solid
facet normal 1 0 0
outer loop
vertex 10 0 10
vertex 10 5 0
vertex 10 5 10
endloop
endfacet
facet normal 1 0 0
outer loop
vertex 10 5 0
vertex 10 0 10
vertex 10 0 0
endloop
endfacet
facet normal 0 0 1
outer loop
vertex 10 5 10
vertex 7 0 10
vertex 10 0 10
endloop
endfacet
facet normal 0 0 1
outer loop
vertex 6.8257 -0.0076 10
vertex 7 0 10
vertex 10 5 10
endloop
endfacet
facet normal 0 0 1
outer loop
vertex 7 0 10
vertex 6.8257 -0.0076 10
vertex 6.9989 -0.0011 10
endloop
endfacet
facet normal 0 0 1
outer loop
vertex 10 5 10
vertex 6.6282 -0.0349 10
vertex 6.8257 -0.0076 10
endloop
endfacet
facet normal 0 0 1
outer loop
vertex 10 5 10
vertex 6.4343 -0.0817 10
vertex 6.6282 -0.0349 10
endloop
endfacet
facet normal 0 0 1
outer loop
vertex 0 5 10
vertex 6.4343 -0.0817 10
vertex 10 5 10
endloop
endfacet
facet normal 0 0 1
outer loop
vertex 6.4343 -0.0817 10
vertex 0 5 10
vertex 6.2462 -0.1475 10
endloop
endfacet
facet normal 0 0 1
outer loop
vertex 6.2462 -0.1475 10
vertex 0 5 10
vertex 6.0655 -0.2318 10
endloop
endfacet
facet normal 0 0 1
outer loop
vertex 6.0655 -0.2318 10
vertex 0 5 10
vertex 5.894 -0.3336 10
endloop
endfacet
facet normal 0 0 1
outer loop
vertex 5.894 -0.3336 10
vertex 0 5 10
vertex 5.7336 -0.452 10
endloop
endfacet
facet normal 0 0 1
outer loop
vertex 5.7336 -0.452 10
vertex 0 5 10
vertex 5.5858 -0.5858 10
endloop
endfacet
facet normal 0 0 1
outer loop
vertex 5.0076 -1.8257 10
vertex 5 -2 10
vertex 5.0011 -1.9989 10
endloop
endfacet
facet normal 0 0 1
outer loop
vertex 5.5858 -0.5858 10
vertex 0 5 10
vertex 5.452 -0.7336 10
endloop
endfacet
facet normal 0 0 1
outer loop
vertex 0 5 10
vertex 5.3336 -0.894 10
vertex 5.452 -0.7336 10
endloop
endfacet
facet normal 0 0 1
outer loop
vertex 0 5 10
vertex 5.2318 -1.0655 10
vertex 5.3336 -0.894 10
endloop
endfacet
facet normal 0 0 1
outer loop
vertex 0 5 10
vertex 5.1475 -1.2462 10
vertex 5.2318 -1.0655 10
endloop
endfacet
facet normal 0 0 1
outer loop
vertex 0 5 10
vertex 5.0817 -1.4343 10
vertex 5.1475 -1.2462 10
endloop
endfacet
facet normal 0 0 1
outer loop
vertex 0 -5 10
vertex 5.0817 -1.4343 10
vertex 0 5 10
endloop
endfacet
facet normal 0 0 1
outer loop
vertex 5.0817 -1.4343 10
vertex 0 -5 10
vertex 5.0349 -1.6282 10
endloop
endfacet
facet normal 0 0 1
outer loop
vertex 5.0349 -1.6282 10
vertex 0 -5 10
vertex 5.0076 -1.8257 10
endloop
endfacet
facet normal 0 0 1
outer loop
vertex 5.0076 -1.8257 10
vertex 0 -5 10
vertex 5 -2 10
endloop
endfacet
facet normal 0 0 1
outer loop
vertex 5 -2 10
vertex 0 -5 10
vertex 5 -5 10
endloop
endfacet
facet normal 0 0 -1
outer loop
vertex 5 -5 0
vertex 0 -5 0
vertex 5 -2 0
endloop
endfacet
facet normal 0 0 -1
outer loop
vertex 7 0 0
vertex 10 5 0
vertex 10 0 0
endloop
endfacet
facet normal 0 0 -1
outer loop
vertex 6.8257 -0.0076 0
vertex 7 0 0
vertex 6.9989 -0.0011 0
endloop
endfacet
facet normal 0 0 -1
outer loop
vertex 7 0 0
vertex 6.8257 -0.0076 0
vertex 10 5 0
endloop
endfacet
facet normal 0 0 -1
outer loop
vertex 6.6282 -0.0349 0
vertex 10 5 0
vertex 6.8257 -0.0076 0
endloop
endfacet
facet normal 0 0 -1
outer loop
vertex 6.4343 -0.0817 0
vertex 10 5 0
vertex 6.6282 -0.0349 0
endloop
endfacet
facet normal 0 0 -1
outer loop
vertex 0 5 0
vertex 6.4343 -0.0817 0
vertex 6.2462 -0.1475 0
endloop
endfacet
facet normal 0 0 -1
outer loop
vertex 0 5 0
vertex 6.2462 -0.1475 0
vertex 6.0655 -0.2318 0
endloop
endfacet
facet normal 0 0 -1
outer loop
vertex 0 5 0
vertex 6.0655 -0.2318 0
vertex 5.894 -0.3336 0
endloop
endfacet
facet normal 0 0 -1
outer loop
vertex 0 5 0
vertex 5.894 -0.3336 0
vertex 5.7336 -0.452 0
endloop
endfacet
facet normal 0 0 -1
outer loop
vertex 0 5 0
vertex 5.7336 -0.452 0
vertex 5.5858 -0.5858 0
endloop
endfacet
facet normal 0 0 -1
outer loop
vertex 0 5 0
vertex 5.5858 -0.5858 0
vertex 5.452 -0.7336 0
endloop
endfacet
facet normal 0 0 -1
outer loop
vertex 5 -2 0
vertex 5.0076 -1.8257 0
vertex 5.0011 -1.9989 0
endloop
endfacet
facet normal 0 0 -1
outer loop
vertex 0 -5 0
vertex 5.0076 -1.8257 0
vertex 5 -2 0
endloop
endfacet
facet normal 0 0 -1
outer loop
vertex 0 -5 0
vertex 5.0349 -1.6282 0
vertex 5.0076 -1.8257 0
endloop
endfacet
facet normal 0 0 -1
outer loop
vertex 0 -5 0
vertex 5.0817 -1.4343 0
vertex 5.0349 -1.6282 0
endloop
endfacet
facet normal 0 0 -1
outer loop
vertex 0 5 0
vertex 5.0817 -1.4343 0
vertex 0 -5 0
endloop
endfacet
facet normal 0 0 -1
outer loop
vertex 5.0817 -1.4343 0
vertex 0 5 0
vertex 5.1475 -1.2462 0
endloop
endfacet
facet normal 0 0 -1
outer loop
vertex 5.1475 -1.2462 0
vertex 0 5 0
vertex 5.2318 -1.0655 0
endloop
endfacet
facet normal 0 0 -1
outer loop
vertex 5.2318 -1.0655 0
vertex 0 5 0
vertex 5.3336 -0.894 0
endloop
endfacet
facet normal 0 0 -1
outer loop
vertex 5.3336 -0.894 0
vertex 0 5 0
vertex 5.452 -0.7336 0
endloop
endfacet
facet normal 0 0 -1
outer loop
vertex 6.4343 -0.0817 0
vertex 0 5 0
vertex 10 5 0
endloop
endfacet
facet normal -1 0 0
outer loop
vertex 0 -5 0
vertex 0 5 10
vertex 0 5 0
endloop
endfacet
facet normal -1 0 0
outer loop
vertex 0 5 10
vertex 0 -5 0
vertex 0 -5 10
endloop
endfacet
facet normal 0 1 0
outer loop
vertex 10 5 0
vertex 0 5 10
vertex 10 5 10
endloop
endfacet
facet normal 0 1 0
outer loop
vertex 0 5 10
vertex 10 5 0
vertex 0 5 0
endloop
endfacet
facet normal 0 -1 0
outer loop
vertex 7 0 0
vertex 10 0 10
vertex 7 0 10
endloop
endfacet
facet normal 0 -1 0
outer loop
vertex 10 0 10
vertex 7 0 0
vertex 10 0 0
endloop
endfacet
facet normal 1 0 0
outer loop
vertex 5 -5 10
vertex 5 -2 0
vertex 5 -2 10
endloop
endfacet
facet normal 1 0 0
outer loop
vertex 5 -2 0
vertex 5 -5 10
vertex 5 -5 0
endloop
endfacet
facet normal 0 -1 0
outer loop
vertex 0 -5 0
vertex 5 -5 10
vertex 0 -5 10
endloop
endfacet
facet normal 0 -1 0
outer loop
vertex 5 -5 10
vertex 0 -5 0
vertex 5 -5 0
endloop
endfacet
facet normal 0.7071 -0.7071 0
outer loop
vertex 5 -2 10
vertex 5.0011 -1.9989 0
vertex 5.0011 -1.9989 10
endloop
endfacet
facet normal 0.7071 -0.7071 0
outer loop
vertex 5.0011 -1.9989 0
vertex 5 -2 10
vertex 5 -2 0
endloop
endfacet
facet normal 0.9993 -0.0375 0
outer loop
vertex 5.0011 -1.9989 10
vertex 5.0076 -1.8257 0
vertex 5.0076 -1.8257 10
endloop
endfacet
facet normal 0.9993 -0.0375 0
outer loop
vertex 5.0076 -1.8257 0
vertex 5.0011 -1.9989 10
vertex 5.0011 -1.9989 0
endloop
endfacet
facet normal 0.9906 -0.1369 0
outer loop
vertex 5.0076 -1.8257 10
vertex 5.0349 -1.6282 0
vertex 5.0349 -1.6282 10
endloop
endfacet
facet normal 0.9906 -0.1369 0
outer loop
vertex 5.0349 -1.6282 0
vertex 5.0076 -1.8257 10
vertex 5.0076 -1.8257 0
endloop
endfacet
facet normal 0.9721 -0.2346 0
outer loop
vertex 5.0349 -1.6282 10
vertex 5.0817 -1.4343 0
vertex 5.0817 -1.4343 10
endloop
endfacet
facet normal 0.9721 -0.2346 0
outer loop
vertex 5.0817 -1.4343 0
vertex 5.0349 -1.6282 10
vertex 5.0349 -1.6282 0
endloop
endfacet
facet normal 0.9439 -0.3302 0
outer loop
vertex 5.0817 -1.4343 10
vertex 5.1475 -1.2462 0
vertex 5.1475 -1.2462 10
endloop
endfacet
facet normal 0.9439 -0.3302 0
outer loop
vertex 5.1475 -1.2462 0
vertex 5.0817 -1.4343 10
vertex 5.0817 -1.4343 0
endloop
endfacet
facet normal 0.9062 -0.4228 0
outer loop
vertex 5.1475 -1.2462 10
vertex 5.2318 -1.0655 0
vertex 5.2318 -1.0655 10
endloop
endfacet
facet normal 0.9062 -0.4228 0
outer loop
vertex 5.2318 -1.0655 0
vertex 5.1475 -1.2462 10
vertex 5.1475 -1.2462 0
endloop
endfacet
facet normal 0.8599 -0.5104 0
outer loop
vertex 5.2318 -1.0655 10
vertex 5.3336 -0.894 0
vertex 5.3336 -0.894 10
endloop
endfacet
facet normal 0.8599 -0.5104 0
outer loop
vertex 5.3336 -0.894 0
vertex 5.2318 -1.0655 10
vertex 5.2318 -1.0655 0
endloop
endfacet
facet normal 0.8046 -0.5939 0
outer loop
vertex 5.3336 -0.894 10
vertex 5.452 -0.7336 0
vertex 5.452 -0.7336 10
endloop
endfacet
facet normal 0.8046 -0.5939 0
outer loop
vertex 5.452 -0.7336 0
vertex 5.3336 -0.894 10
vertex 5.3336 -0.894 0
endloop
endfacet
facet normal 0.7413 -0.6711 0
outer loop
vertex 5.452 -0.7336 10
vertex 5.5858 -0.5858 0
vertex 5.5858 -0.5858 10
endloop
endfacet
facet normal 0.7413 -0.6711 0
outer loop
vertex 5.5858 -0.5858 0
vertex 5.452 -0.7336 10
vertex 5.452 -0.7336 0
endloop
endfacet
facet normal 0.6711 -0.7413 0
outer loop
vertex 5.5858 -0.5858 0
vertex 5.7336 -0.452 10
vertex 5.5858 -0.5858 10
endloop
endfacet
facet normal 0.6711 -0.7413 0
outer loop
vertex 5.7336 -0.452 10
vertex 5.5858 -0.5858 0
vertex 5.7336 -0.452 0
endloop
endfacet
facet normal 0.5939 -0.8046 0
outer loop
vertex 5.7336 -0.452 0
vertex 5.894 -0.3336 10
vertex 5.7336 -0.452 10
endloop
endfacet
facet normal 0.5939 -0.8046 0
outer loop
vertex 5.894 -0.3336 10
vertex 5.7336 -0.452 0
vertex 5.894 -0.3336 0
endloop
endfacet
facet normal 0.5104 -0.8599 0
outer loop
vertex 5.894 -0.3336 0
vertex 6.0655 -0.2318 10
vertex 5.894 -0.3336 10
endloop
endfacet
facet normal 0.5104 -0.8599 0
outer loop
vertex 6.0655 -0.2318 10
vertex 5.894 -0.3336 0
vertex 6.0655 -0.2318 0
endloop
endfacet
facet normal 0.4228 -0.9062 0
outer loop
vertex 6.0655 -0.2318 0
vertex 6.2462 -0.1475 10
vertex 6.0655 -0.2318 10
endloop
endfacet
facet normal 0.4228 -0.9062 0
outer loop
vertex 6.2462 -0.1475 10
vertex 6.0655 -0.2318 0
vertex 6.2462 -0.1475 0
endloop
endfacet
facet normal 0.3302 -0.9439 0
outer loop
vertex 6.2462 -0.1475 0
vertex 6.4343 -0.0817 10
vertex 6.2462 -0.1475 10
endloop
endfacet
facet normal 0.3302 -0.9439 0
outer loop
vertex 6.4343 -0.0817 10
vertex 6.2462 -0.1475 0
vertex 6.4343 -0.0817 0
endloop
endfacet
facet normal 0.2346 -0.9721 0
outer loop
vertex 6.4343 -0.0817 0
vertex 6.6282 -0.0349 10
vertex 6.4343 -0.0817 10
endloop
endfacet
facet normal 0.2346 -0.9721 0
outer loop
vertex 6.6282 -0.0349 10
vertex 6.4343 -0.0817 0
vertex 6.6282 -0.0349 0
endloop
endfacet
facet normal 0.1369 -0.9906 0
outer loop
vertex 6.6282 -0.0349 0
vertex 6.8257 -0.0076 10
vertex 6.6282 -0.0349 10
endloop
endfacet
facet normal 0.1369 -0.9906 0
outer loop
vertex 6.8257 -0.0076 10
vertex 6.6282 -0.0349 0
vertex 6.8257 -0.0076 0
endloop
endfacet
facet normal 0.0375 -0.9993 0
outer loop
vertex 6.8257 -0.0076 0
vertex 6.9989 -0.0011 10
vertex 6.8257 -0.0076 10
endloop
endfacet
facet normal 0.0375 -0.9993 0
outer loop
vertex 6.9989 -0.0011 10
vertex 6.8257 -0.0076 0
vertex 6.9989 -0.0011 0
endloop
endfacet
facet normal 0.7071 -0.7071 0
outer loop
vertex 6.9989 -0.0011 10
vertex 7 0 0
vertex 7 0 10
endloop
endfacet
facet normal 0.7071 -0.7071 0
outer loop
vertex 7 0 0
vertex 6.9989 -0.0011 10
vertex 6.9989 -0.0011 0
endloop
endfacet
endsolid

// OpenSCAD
// file: davel.scad
/*
Library to draw simple bevel borders and buttresses.

By Davide Orlandi - davide[at]davideorlandi.it

    This program is free software: you can redistribute it and/or modify
    it under the terms of the GNU Affero General Public License as
		published by the Free Software Foundation, either version 3 of
		the License, or (at your option) any later version.

    This program is distributed in the hope that it will be useful,
    but WITHOUT ANY WARRANTY; without even the implied warranty of
    MERCHANTABILITY or FITNESS FOR A PARTICULAR PURPOSE.  See the
    GNU Affero General Public License for more details.

    You should have received a copy of the GNU Affero General Public
		License along with this program.  If not, see
		<http://www.gnu.org/licenses/>.
*/


/* -------- bevel ----- */

/*
Draw a bevel.
- length: length of the bevel, longitudinally.
- n1: normal vector of the first surface.
- n2: normal vector of the second surface.
- r: radius of the bevel.
- side_offset: extra length added to the sides (optional, default 0.01).
- back offset: extra thickness added to the back of the bevel (optional, default 0.01).
*/
module davel_bevel(length, n1, n2, r, side_offset=0.01, back_offset = 0.01)
{
	assert(is_list(n1));
	assert(is_list(n2));
	
	n1n = n1 / norm(n1);
	n2n = n2 / norm(n2);
	
	assert(n1n != n2n);
	
	dir = cross(n1, n2);
	
	assert(norm(dir) > 0);
	
	dirn = dir / norm(dir);
	
	nt = n1n + n2n;
	
	assert(norm(nt) > 0);
	
	ntn = nt / norm(nt);
	ang = 90 - acos(n2n * ntn);
	c = -ntn * r / sin(ang);
	ptang1 = c + n1n * r;
	ptang2 = c + n2n * r;
		
	newz = dirn;
	newx = ntn;
	newy = cross(newz, newx);
	
	m = davel_matrix_from_columns4([newx, newy, newz]);
	m_inv = davel_transpose3(davel_matrix4_to_3(m));
	
	ptang1_off = ptang1 + n1n * back_offset;
	ptang2_off = ptang2 + n2n * back_offset;
	origin_off = ntn * back_offset;
	profile = [origin_off, ptang1_off, ptang1, ptang2, ptang2_off];
	
	// rotate the points so that what was the axis of the bevel (dir) is
	// now the z axis and the normal of the bevel (ntn) is now the x
	// axis.
	profile_derotated = davel_matrix_product_vectors3(m_inv,profile);
	c_derotated = davel_matrix_product_vector3(m_inv, c);
	
	// create a 2d list of point to use for polygon()
	profile_flat = davel_vectors3_to_2(profile_derotated);
	
	multmatrix(m)
	{
		linear_extrude(height=length + side_offset*2, center=true)
		{
			difference()
			{
				#polygon(profile_flat);
				
				translate(c_derotated) circle(r=r);
			}
		}
	}
}

/*
Draw bevels for a box.
- size: 3-dimension vector size of the box.
- r: radius of the bevel.
- center: boolean, if true the box is centered. Optional, default is false.
- front, back, top, bottom, left, right: boolean, draw or omit bevels for that
  corner. They are all optional, default is true.
- round_vert: boolean, if true draw a rounded vertex using a sphere. Optional,
  default is true.
- side_offset: extra length added to the sides og the single bevels
  (optional, default 0.01).
- back offset: extra thickness added to the back of the single bevels
  (optional, default 0.01).
*/
module davel_box_bevel(size, r, center=false, front=true, back=true, top=true, bottom=true, left=true, right=true, round_vert=true, side_offset = 0.01, back_offset = 0.01)
{	
	translate(center ? -size/2 : [0,0,0])
	{
		union()
		{
			if (top && left)
				davel_bevel_pos([0, size[1]/2, size[2]], size[1], [-1,0,0], [0,0,1], r, side_offset, back_offset);
			if (top && right)
				davel_bevel_pos([size[0], size[1]/2, size[2]], size[1], [1,0,0], [0,0,1], r, side_offset, back_offset);
			if (bottom && left)
				davel_bevel_pos([0, size[1]/2, 0], size[1], [-1,0,0], [0,0,-1], r, side_offset, back_offset);
			if (bottom && right)
				davel_bevel_pos([size[0], size[1]/2, 0], size[1], [1,0,0], [0,0,-1], r, side_offset, back_offset);
			
			if (front && top)
				davel_bevel_pos([size[0]/2, 0, size[2]], size[0], [0,-1,0], [0,0,1], r, side_offset, back_offset);
			if (front && bottom)
				davel_bevel_pos([size[0]/2, 0, 0], size[0], [0,-1,0], [0,0,-1], r, side_offset, back_offset);
			if (back && top)
				davel_bevel_pos([size[0]/2, size[1], size[2]], size[0], [0,1,0], [0,0,1], r, side_offset, back_offset);
			if (back && bottom)
				davel_bevel_pos([size[0]/2, size[1], 0], size[0], [0,1,0], [0,0,-1], r, side_offset, back_offset);
			
			if (front && left)
				davel_bevel_pos([0, 0, size[2]/2], size[2], [0,-1,0], [-1,0,0], r, side_offset, back_offset);
			if (front && right)
				davel_bevel_pos([size[0], 0, size[2]/2], size[2], [0,-1,0], [1,0,0], r, side_offset, back_offset);
			if (back && left)
				davel_bevel_pos([0, size[1], size[2]/2], size[2], [0,1,0], [-1,0,0], r, side_offset, back_offset);
			if (back && right)
				davel_bevel_pos([size[0], size[1], size[2]/2], size[2], [0,1,0], [1,0,0], r, side_offset, back_offset);
			
			if (round_vert)
			{
				if (bottom && front && left)
					davel_round_vertex([0,0,0], [-1,-1,-1], r);
				if (bottom && front && right)
					davel_round_vertex([size[0],0,0], [1,-1,-1], r);
				if (top && front && left)
					davel_round_vertex([0,0,size[2]], [-1,-1,1], r);
				if (top && front && right)
					davel_round_vertex([size[0],0,size[2]], [1,-1,1], r);
				if (bottom && back && left)
					davel_round_vertex([0,size[1],0], [-1,1,-1], r);
				if (bottom && back && right)
					davel_round_vertex([size[0],size[1],0], [1,1,-1], r);
				if (top && back && left)
					davel_round_vertex([0,size[1],size[2]], [-1,1,1], r);
				if (top && back && right)
					davel_round_vertex([size[0],size[1],size[2]], [1,1,1], r);
			}
		}
	}
}

/*
Draw a bevel, specifying its center point (so you don't need to translate()
it yourself).
- pos: 3-dimension vector position.
- length: length of the bevel, longitudinally.
- n1: normal vector of the first surface.
- n2: normal vector of the second surface.
- r: radius of the bevel.
- side_offset: extra length added to the sides (optional, default 0.01).
- back offset: extra thickness added to the back of the bevel (optional, default 0.01).
*/
module davel_bevel_pos(pos, length, n1, n2, r, side_offset=0.01, back_offset = 0.01)
{
	translate(pos) davel_bevel(length, n1, n2, r, side_offset=side_offset, back_offset=back_offset);
}

/*
Draw a bevel, specifying its side points (top and bottom
of the "cylinder") instead of center point and length.
- p1: 3-dimension vector of the first end.
- p2: 3-dimension vector of the second end.
- n1: normal vector of the first surface.
- n2: normal vector of the second surface.
- r: radius of the bevel.
- side_offset: extra length added to the sides (optional, default 0.01).
- back offset: extra thickness added to the back of the bevel (optional, default 0.01).
*/
module davel_bevel_points(p1, p2, n1, n2, r, side_offset=0.01, back_offset = 0.01)
{
	davel_bevel_pos((p1+p2)/2, norm(p2-p1), n1, n2, r, side_offset=side_offset, back_offset=back_offset);
}


/* ----- buttress ----- */

/*
Draw a buttress.
- length: length of the buttress, longitudinally.
- n1: normal vector of the first surface.
- n2: normal vector of the second surface.
- r: radius of the buttress.
- side_offset: extra length added to the sides (optional, default 0).
- back offset: extra thickness added to the back of the buttress (optional, default 0.01).
*/
module davel_buttress(length, n1, n2, r, side_offset=0, back_offset = 0.01)
{
	davel_bevel(length, -n1, -n2, r, side_offset=side_offset, back_offset=back_offset);
}

/*
Draw a buttress, specifying its center point (so you don't need to translate()
it yourself).
- pos: 3-dimension vector position.
- length: length of the buttress, longitudinally.
- n1: normal vector of the first surface.
- n2: normal vector of the second surface.
- r: radius of the buttress.
- side_offset: extra length added to the sides (optional, default 0).
- back offset: extra thickness added to the back of the buttress (optional, default 0.01).
*/
module davel_buttress_pos(pos, length, n1, n2, r, side_offset=0, back_offset=0.01)
{
	translate(pos) davel_buttress(length, n1, n2, r, side_offset=side_offset, back_offset=back_offset);
}

/*
Draw a buttress, specifying its side points (top and bottom
of the "cylinder") instead of center point and length.
- p1: 3-dimension vector of the first end.
- p2: 3-dimension vector of the second end.
- n1: normal vector of the first surface.
- n2: normal vector of the second surface.
- r: radius of the buttress.
- side_offset: extra length added to the sides (optional, default 0).
- back offset: extra thickness added to the back of the buttress (optional, default 0.01).
*/
module davel_buttress_points(p1, p2, n1, n2, r, side_offset=0, back_offset=0.01)
{
	davel_buttress_pos((p1+p2)/2, norm(p2-p1), n1, n2, r, side_offset=side_offset, back_offset=back_offset);
}

/*
Draw buttresses for a box.
- size: 3-dimension vector size of the box.
- r: radius of the buttress.
- center: boolean, if true the box is centered. Optional, default is false.
- front, back, top, bottom, left, right: boolean, draw or omit buttresses for that
  corner. They are all optional, default is true.
- round_vert: boolean, if true draw a rounded vertex using a sphere. Optional,
  default is true.
- back offset: extra thickness added to the back of the single buttresses
  (optional, default 0.01).
*/
module davel_box_buttress(size, r, center=false, front=true, back=true, top=true, bottom=true, left=true, right=true, round_vert=true, back_offset=0.01)
{
	davel_box_bevel(size, r, center, front, back, top, bottom, left, right, round_vert, side_offset=0, back_offset=back_offset);
}


// ===================== functions and "private" modules =====================

module davel_round_vertex(pos, dir, r)
{
	translate(pos - dir * r)
	{
		difference()
		{
			translate(dir * r / 2) cube(r, center=true);
			sphere(r=r);
		}
	}
}

function davel_transpose4(m) = [
	[m[0][0],m[1][0],m[2][0],m[3][0]],
  [m[0][1],m[1][1],m[2][1],m[3][1]],
	[m[0][2],m[1][2],m[2][2],m[3][2]],
	[m[0][3],m[1][3],m[2][3],m[3][3]]
];

function davel_transpose3(m) = [
	[m[0][0],m[1][0],m[2][0]],
  [m[0][1],m[1][1],m[2][1]],
	[m[0][2],m[1][2],m[2][2]]
];

function davel_matrix_product_vector3(m,v) = [
	m[0][0]*v[0] + m[0][1]*v[1] + m[0][2]*v[2],
	m[1][0]*v[0] + m[1][1]*v[1] + m[1][2]*v[2],
	m[2][0]*v[0] + m[2][1]*v[1] + m[2][2]*v[2]
];

function davel_matrix_product_vectors3(m,vectors) = [
	for (v=vectors) davel_matrix_product_vector3(m,v)
];

function davel_matrix_from_rows3(rows) = [rows[0], rows[1], rows[2]];

function davel_matrix_from_columns3(columns) = davel_transpose3(davel_matrix_from_rows3(columns));

function davel_matrix_from_rows4(rows) = [
	concat(rows[0],0),
	concat(rows[1],0),
	concat(rows[2],0),
	[0,0,0,1]
];

function davel_matrix_from_columns4(columns) = davel_transpose4(davel_matrix_from_rows4(columns));

function davel_matrix3_to_4(m) = davel_matrix_from_rows4([m[0], m[1], m[2]]);

function davel_matrix4_to_3(m) = [
	[m[0][0], m[0][1], m[0][2]],
	[m[1][0], m[1][1], m[1][2]],
	[m[2][0], m[2][1], m[2][2]]
];

function davel_vector3_to_2(v) = [v[0], v[1]];

function davel_vectors3_to_2(vectors) = [ for(v=vectors) davel_vector3_to_2(v) ];

/* ----- helper modules for debugging (draw a vector or an origin) ----- */

module davel_debug_draw_origin(alpha = 1.0)
{
	$fn = 16;
	union()
	{
		color("red", alpha)
			davel_debug_draw_vector([1,0,0], with_head=true);
		color("green", alpha)
			davel_debug_draw_vector([0,1,0], with_head=true);
		color("blue", alpha)
			davel_debug_draw_vector([0,0,1], with_head=true);
	}
}

module davel_debug_draw_vector(v, with_head=true)
{
	vl = norm(v);	// length
	b = acos(v[2] / vl);	// right ascension
	c = atan2(v[1],v[0]);	// azimuth
	rotate([0,b,c])
	{
		cylinder(r=0.01, h = vl);
		if (with_head)
		{
			translate([0,0,vl])
				cylinder(d1=0.05, d2=0, h=0.1);
		}
	}
}
// main file
/*
Usage examples of davel.scad: buttresses.

By Davide Orlandi - davide[at]davideorlandi.it

    This program is free software: you can redistribute it and/or modify
    it under the terms of the GNU Affero General Public License as
		published by the Free Software Foundation, either version 3 of
		the License, or (at your option) any later version.

    This program is distributed in the hope that it will be useful,
    but WITHOUT ANY WARRANTY; without even the implied warranty of
    MERCHANTABILITY or FITNESS FOR A PARTICULAR PURPOSE.  See the
    GNU Affero General Public License for more details.

    You should have received a copy of the GNU Affero General Public
		License along with this program.  If not, see
		<http://www.gnu.org/licenses/>.
*/

use <davel.scad>

$fa=3;
$fs=0.2;

buttress_demo();


module buttress_demo()
{
	union()
	{
		union()
		{
			cube([10,5,10]);
			translate([0,-5,0])
				cube([5,10,10]);
		}

		/* here we are using the "*_points" version, but the basic
		version and the "*_pos" version are also available for buttresses. */
		davel_buttress_pos([5,0,5], 10, [0,-1,0], [1,0,0], 2);
		
	}
}
